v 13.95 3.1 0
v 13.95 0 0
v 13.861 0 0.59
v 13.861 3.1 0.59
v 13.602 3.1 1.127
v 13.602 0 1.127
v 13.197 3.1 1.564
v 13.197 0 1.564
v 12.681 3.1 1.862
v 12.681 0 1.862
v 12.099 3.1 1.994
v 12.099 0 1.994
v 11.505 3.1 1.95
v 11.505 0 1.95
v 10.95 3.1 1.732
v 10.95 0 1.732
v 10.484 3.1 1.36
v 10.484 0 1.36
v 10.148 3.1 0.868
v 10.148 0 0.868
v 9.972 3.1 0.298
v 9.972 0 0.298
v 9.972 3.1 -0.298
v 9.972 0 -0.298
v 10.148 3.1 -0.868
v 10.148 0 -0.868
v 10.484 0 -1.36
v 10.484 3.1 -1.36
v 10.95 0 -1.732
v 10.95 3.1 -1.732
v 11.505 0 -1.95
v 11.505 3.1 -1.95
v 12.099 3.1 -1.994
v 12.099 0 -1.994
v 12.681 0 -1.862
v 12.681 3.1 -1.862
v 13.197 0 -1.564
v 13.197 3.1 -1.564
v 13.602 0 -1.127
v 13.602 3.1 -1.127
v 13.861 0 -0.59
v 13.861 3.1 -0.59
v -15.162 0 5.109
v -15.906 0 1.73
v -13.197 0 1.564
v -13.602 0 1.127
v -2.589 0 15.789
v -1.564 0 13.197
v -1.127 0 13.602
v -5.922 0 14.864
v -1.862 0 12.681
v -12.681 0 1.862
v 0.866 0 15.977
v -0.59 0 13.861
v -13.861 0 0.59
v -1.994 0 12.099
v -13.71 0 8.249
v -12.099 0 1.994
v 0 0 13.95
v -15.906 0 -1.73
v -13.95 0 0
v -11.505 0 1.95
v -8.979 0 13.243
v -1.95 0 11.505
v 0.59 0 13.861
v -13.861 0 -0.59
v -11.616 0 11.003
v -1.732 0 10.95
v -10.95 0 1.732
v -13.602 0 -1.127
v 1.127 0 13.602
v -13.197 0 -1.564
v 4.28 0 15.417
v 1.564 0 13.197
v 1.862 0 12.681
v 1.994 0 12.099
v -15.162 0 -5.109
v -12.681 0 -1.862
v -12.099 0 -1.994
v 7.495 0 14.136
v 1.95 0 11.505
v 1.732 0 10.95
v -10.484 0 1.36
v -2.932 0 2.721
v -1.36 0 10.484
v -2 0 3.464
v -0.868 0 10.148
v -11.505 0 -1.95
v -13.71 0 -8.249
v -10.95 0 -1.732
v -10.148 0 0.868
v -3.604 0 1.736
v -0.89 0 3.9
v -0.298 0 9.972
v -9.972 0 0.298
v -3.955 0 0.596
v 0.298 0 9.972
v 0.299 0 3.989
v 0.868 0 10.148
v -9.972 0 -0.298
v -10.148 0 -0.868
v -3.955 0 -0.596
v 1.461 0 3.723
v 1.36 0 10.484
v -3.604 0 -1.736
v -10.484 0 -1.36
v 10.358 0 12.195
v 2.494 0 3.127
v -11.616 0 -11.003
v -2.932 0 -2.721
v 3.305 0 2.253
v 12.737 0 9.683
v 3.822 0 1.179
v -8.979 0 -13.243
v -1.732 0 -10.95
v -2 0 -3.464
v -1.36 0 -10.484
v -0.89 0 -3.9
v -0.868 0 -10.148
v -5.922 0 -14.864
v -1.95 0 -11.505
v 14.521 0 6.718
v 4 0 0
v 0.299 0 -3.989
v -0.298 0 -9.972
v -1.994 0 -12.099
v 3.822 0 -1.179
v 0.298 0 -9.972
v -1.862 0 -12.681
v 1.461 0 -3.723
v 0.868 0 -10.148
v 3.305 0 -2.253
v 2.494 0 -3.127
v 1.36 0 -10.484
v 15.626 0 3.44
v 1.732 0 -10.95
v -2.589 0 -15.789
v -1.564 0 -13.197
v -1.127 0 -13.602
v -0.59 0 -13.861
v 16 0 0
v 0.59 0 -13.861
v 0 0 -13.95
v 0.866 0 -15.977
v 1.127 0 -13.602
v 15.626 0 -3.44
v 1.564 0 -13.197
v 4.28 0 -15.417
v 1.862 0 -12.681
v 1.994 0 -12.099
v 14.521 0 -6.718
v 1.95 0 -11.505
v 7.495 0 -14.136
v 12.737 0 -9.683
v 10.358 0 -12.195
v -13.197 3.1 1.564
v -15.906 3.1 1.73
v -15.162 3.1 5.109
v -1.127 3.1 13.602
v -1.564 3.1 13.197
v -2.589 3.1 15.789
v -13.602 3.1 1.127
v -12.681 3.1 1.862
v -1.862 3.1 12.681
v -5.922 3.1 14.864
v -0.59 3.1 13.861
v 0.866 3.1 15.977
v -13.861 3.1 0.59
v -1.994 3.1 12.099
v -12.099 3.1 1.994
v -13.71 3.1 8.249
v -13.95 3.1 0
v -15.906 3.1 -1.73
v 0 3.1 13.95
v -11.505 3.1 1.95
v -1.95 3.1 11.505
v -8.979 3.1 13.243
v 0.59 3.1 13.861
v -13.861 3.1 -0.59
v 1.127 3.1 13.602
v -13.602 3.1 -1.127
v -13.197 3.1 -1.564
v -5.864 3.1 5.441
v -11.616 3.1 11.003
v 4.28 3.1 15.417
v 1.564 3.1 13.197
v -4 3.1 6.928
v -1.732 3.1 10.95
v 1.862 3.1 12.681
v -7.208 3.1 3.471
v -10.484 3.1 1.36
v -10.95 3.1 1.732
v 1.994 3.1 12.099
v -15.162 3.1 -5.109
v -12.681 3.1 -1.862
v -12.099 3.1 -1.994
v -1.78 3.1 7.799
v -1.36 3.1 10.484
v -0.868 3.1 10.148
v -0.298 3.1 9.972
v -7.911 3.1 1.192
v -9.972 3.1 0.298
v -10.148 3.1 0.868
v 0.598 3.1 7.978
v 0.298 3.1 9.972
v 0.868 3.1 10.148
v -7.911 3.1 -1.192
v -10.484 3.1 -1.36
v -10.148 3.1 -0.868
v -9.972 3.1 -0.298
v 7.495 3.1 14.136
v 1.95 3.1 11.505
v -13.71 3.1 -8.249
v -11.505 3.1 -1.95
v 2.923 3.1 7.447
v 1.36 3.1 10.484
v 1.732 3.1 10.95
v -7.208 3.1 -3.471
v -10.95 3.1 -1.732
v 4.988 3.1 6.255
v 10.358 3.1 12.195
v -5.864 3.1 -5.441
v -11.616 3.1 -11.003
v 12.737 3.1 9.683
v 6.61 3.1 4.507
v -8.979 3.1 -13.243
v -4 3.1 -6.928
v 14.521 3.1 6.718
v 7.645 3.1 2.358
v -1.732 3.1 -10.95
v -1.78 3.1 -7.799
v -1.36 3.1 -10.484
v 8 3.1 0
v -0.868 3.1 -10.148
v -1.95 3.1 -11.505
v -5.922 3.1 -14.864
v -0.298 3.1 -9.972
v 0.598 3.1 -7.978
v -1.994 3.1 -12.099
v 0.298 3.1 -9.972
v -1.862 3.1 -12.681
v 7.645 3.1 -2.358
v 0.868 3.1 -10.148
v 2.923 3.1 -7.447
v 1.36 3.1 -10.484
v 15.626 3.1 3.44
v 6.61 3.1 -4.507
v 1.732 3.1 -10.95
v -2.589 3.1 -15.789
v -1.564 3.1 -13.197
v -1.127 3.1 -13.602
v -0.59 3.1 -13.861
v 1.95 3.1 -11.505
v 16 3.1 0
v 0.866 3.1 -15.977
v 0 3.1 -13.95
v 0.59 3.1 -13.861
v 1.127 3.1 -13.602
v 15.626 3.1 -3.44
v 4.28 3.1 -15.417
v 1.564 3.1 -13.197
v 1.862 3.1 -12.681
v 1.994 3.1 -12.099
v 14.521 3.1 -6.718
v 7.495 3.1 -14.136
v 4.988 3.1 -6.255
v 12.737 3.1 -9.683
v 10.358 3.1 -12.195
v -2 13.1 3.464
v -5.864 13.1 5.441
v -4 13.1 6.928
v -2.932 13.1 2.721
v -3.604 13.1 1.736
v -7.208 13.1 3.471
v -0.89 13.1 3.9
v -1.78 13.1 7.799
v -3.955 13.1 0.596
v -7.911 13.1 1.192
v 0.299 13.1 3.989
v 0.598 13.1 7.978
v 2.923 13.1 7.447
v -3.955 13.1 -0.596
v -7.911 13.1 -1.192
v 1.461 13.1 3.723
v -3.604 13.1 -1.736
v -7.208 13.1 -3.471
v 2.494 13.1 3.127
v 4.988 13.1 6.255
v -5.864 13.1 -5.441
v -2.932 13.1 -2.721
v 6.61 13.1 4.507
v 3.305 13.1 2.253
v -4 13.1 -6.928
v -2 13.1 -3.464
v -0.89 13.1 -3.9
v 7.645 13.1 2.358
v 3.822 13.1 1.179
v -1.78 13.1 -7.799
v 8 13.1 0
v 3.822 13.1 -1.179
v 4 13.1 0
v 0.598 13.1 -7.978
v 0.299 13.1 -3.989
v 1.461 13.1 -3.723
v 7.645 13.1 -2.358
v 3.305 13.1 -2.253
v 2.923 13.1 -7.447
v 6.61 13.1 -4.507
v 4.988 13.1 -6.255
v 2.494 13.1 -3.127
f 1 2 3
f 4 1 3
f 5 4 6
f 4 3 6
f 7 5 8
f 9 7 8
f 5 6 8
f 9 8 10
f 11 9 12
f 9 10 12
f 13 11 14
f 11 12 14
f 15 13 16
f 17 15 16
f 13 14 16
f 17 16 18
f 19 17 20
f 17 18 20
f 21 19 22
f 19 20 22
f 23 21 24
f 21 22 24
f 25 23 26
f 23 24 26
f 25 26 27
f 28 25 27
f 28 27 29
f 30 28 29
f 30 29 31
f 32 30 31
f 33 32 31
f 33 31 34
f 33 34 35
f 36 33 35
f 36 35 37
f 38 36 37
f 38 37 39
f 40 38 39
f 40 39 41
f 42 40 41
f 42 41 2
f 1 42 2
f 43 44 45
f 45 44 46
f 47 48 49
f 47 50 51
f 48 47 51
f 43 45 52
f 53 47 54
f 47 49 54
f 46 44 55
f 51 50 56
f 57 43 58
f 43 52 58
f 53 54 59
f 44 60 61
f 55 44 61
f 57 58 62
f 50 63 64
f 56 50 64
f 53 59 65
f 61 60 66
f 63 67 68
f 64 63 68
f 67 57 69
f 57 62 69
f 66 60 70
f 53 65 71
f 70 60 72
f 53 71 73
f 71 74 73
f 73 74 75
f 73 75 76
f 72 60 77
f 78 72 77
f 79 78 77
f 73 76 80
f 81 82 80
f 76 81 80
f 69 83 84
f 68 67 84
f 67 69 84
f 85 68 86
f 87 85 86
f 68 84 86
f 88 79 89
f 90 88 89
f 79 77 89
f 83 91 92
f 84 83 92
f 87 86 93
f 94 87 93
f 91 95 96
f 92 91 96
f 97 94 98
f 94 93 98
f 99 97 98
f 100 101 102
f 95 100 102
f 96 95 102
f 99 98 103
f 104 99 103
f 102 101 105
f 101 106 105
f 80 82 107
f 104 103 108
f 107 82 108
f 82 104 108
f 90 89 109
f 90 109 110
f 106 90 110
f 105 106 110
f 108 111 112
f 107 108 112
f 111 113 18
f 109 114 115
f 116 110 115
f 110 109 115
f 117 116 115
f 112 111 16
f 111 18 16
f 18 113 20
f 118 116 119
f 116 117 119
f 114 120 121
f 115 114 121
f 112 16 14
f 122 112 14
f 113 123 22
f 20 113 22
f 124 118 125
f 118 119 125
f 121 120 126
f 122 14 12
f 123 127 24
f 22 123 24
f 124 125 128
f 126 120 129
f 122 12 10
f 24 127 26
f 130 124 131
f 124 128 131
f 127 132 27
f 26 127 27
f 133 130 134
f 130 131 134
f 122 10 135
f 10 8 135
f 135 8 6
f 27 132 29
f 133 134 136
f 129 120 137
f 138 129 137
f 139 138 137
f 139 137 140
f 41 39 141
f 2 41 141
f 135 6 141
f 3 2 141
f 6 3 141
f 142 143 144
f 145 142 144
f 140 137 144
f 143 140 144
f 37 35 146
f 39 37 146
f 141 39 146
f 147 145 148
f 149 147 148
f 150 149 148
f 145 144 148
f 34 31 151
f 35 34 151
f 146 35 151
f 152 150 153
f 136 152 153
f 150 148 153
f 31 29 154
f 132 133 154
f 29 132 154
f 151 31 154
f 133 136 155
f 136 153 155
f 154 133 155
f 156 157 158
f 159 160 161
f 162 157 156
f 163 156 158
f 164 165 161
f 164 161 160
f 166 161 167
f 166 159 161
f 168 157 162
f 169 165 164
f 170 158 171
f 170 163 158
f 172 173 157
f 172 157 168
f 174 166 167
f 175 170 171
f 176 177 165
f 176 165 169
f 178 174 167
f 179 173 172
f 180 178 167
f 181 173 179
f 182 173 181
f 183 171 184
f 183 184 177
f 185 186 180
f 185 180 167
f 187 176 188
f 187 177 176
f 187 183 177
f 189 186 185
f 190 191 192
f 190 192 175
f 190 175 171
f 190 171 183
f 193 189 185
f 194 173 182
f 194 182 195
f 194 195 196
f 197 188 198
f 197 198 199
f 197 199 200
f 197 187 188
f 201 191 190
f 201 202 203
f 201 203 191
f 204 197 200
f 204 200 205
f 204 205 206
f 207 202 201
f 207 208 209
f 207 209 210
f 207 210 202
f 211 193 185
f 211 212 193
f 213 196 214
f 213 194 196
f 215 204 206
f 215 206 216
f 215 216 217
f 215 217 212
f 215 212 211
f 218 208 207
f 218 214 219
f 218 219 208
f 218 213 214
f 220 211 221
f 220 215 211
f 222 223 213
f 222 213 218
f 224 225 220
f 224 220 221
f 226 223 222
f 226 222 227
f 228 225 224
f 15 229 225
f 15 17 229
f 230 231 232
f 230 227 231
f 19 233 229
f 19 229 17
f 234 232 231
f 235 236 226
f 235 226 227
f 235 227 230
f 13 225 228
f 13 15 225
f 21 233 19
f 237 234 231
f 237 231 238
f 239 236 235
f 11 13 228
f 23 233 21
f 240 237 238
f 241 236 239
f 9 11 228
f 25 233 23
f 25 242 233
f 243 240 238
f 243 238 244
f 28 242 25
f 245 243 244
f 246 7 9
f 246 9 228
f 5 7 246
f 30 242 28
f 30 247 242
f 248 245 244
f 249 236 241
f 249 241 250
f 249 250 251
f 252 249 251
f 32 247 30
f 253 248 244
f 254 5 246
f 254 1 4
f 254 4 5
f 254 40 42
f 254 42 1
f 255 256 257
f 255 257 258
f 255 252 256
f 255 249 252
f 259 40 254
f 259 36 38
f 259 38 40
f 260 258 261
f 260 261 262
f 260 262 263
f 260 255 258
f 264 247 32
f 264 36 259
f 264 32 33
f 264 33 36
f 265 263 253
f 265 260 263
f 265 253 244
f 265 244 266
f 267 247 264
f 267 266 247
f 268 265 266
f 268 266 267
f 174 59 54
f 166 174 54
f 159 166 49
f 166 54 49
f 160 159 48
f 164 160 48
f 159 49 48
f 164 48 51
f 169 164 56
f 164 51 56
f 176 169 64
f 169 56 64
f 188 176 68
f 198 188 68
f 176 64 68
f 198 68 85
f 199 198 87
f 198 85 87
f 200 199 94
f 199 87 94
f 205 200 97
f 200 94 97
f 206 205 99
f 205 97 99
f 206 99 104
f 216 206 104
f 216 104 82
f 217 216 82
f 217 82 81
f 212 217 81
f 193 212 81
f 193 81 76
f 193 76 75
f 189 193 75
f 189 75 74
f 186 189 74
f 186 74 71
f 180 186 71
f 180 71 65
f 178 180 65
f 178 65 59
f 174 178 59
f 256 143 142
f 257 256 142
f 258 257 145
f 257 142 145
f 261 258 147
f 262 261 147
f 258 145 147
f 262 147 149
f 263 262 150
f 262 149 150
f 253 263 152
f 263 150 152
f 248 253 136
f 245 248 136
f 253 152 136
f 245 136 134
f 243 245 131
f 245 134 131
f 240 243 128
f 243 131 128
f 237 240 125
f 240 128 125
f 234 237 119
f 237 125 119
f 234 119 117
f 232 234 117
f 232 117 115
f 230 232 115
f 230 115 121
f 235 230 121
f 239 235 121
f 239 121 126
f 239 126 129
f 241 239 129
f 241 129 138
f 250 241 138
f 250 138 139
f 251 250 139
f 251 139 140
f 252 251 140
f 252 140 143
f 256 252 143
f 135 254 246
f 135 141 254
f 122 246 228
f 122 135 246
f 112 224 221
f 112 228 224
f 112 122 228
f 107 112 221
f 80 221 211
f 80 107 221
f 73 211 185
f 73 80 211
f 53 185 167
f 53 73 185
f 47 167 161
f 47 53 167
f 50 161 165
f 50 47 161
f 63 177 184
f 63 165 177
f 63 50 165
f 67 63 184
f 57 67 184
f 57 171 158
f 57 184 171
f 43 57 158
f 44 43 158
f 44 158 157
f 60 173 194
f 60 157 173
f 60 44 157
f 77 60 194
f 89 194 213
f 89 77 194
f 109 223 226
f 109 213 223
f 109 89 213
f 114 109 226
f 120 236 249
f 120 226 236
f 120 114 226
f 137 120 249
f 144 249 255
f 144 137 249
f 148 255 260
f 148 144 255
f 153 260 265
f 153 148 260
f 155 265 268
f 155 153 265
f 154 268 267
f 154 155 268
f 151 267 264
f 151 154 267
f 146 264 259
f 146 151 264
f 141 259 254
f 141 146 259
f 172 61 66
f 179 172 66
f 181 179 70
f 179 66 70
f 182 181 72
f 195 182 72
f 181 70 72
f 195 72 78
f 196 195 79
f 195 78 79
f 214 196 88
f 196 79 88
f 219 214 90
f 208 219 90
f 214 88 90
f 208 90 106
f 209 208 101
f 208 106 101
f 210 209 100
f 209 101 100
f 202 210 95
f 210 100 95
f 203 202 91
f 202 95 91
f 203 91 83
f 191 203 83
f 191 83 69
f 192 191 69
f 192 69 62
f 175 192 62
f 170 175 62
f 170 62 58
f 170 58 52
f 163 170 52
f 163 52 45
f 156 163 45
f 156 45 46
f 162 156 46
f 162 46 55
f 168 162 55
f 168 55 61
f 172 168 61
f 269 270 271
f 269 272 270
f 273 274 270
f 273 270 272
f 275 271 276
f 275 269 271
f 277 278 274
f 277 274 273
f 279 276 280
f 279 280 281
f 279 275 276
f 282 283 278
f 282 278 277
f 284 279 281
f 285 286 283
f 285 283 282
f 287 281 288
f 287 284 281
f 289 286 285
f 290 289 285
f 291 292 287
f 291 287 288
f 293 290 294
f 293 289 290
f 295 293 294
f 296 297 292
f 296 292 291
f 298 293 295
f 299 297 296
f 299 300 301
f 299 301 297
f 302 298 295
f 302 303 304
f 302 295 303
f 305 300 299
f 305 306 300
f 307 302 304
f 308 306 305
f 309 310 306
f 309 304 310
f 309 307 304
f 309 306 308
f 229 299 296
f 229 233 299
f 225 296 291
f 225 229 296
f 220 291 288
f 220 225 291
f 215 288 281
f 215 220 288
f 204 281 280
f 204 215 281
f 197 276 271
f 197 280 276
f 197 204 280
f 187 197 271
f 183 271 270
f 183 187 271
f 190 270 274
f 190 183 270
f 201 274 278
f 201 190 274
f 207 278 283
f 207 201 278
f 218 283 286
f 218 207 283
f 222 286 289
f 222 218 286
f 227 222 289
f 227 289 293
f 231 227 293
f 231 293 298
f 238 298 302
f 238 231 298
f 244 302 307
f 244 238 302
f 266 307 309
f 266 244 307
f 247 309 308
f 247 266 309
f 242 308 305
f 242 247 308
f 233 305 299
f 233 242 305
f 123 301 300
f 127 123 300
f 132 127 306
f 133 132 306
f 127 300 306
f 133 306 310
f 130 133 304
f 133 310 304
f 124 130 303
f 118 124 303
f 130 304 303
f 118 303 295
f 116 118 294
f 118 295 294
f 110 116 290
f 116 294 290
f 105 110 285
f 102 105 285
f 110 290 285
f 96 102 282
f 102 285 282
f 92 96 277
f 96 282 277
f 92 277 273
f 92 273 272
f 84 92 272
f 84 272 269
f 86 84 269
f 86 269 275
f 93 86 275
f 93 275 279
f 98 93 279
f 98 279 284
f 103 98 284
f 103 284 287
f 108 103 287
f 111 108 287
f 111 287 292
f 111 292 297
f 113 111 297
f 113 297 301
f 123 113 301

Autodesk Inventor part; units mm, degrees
ref_plane "YZ Plane" through (0, 0, 0) normal (1, 0, 0) x (0, 1, 0)
ref_plane "XZ Plane" through (0, 0, 0) normal (0, 1, 0) x (-1, 0, 0)
ref_plane "XY Plane" through (0, 0, 0) normal (0, 0, 1) x (1, 0, 0)
sketch "Sketch1" plane through (0, 0, 0) normal (0, 0, 1) x (1, 0, 0)
  line L0 (0, 0) -> (0, 13.1) construction
  line L1 (4, 0) -> (4, 13.1)
  line L2 (4, 13.1) -> (8, 13.1)
  line L3 (8, 13.1) -> (8, 3.1)
  line L4 (8, 3.1) -> (16, 3.1)
  line L5 (16, 3.1) -> (16, 0)
  line L6 (16, 0) -> (4, 0)
  point P0 (8, 8.1)
  point P1 (8, 8.1)
  dimension "d0" = 13.1
  dimension "d1" = 10
  dimension "d2" = 3.1
  dimension "d3" = 32
  dimension "d4" = 16
  dimension "d5" = 8
revolve "Revolution1" add sketch "Sketch1" angle 360 about axis through (0, 0, 0) along (0, 1, 0)
sketch "Sketch2" plane through (0, 0, 0) normal (0, -1, 0) x (1, 0, 0)
  circle A0 centre (11.95, 0) radius 2
  line L0 (13.95, 0) -> (16, 0) construction
  circle A1 centre (0, 0) radius 16 construction
  dimension "d7" = 4
  dimension "d8" = 2.05
extrude "MountHole" cut sketch "Sketch2" against normal through all
pattern_circular "Circular Pattern1" count 4 over 360 about axis through (0, 6.55, 0) along (0, -1, 0) of "MountHole"
equation "\"d0\" = flangeCoupling_height"
equation "\"d1\" = flangeCoupling_collarHeight"
equation "\"d2\" = flangeCoupling_flangeHeight"
equation "\"d3\" = flangeCoupling_flangeDiameter"
equation "\"d4\" = flangeCoupling_collarOuterDiameter"
equation "\"d5\" = flangeCoupling_innerDiameter"
equation "\"d7\" = flangeCoupling_mountHoleDiameter + gap"
equation "\"d8\" = flangeCoupling_mountHoleEdgeToEdge"
equation "\"gap\" = 0.1"
equation "\"airgap\" = 0.4"
equation "\"wallgap\" = 2"
equation "\"driveMagnet_height\" = 5"
equation "\"halbachMagnet_height\" = 3"
equation "\"rotorBandBolt_diameter\" = 2"
equation "\"rotorBandBolt_headDiameter\" = 3.98"
equation "\"rotorBandBolt_headHeight\" = 2"
equation "\"rotorBandHexNut_sideToSide\" = 4"
equation "\"rotorBandHexNut_height\" = 1.2"
equation "\"rotorBandSquareNut_sideLength\" = 4"
equation "\"rotorBandSquareNut_height\" = 1.2"
equation "\"sensorMagnet_diameter\" = 5"
equation "\"sensorMagnet_height\" = 2.66667"
equation "\"rotorRadius\" = 2 * gap + driveMagnet_centerSpacingRadius + driveMagnet_length + wallgap"
equation "\"rotor_mountingLipHeight\" = 0.5 * statorThickness"
equation "\"shaftDiameter\" = 8"
equation "\"flangeBearing_innerDiameter\" = shaftDiameter"
equation "\"flangeBearing_outerDiameter\" = 16"
equation "\"flangeBearing_flangeDiameter\" = 18"
equation "\"flangeBearing_height\" = 5"
equation "\"flangeBearing_flangeHeight\" = 1"
equation "\"statorThickness\" = coilThickness + 2 * wallgap"
equation "\"rotorBandThickness\" = wallgap + rotorBandBolt_headHeight + gap"
equation "\"flangeCoupling_innerDiameter\" = shaftDiameter"
equation "\"flangeCoupling_collarOuterDiameter\" = 16"
equation "\"flangeCoupling_flangeDiameter\" = 32"
equation "\"flangeCoupling_collarHeight\" = 10"
equation "\"flangeCoupling_flangeHeight\" = 3.1"
equation "\"flangeCoupling_flangeHoleDiameter\" = 3.9"
equation "\"flangeCoupling_flangeHoleEdgeToEdge\" = 2.05"
equation "\"flangeCoupling_height\" = flangeCoupling_collarHeight + flangeCoupling_flangeHeight"
equation "\"flangeCoupling_mountHoleDiameter\" = 3.9"
equation "\"flangeCoupling_mountHoleEdgeToEdge\" = 2.05"
equation "\"statorRadius\" = driveMagnet_length + driveMagnet_centerSpacingRadius + 2 * gap"
equation "\"coilThickness\" = 12"
equation "\"statorMountBolt_diameter\" = 4"
equation "\"statorMountBolt_headDiameter\" = 7"
equation "\"statorMountBolt_headHeight\" = 4"
equation "\"statorMountBolt_shaftLength\" = coilThickness + flangeCoupling_flangeHeight + wallgap"
equation "\"statorMountHexNut_height\" = 4"
equation "\"statorMountHexNut_sideToSide\" = 8"
equation "\"sensorMagnet_ringRadius\" = 0.5 * driveMagnet_centerSpacingRadius + 2 * wallgap"
equation "\"coil_percentCoverage\" = 0.6"
equation "\"statorSpokeDegrees\" = 4deg"
equation "\"coil_bulge\" = 3"
equation "\"statorCoilBolt_shaftLength\" = coilThickness"
equation "\"statorCoilHexNut_height\" = 1.2"
equation "\"statorCoilBolt_headHeight\" = 2"
equation "\"statorCoilBolt_diameter\" = 2"
equation "\"statorCoilBolt_headDiameter\" = 3.98"
equation "\"statorCoilHexNut_sideToSide\" = 4"
equation "\"magnetWire_outerDiameter\" = 0.8128"
equation "\"printingLayerHeight\" = 0.2"
equation "\"circuitBoard_height\" = 1.6"
equation "\"hallEffectSensor_width\" = 1.6"
equation "\"hallEffectSensor_length\" = 3"
equation "\"hallEffectSensor_height\" = 1.1"
equation "\"hallEffectSensor_pinLength\" = 0.6"
equation "\"circuitboardMountHexNut_height\" = 1.2"
equation "\"circuitboardMountHexNut_sideToSide\" = 4"
equation "\"circuitboardMountBolt_headHeight\" = 2"
equation "\"circuitboardMountBolt_shaftLength\" = coilThickness"
equation "\"circuitboardMountBolt_diameter\" = 2"
equation "\"circuitboardMountBolt_headDiameter\" = 3.98"
equation "\"statorShellBolt_headDiameter\" = 5.68"
equation "\"statorShellHexNut_height\" = 2.3"
equation "\"statorShellBolt_shaftLength\" = statorThickness - statorShellBolt_countersinkDepth"
equation "\"statorShellBolt_headHeight\" = 3"
equation "\"statorShellHexNut_sideToSide\" = 5.3"
equation "\"statorShellBolt_diameter\" = 3"
equation "\"driveMagnet_centerSpacingRadius\" = 38.96113"
equation "\"driveMagnet_length\" = 60"
equation "\"statorShellBolt_countersinkDepth\" = 3.4"
properties part number "FlangeCoupling" material "Steel, Mild"
